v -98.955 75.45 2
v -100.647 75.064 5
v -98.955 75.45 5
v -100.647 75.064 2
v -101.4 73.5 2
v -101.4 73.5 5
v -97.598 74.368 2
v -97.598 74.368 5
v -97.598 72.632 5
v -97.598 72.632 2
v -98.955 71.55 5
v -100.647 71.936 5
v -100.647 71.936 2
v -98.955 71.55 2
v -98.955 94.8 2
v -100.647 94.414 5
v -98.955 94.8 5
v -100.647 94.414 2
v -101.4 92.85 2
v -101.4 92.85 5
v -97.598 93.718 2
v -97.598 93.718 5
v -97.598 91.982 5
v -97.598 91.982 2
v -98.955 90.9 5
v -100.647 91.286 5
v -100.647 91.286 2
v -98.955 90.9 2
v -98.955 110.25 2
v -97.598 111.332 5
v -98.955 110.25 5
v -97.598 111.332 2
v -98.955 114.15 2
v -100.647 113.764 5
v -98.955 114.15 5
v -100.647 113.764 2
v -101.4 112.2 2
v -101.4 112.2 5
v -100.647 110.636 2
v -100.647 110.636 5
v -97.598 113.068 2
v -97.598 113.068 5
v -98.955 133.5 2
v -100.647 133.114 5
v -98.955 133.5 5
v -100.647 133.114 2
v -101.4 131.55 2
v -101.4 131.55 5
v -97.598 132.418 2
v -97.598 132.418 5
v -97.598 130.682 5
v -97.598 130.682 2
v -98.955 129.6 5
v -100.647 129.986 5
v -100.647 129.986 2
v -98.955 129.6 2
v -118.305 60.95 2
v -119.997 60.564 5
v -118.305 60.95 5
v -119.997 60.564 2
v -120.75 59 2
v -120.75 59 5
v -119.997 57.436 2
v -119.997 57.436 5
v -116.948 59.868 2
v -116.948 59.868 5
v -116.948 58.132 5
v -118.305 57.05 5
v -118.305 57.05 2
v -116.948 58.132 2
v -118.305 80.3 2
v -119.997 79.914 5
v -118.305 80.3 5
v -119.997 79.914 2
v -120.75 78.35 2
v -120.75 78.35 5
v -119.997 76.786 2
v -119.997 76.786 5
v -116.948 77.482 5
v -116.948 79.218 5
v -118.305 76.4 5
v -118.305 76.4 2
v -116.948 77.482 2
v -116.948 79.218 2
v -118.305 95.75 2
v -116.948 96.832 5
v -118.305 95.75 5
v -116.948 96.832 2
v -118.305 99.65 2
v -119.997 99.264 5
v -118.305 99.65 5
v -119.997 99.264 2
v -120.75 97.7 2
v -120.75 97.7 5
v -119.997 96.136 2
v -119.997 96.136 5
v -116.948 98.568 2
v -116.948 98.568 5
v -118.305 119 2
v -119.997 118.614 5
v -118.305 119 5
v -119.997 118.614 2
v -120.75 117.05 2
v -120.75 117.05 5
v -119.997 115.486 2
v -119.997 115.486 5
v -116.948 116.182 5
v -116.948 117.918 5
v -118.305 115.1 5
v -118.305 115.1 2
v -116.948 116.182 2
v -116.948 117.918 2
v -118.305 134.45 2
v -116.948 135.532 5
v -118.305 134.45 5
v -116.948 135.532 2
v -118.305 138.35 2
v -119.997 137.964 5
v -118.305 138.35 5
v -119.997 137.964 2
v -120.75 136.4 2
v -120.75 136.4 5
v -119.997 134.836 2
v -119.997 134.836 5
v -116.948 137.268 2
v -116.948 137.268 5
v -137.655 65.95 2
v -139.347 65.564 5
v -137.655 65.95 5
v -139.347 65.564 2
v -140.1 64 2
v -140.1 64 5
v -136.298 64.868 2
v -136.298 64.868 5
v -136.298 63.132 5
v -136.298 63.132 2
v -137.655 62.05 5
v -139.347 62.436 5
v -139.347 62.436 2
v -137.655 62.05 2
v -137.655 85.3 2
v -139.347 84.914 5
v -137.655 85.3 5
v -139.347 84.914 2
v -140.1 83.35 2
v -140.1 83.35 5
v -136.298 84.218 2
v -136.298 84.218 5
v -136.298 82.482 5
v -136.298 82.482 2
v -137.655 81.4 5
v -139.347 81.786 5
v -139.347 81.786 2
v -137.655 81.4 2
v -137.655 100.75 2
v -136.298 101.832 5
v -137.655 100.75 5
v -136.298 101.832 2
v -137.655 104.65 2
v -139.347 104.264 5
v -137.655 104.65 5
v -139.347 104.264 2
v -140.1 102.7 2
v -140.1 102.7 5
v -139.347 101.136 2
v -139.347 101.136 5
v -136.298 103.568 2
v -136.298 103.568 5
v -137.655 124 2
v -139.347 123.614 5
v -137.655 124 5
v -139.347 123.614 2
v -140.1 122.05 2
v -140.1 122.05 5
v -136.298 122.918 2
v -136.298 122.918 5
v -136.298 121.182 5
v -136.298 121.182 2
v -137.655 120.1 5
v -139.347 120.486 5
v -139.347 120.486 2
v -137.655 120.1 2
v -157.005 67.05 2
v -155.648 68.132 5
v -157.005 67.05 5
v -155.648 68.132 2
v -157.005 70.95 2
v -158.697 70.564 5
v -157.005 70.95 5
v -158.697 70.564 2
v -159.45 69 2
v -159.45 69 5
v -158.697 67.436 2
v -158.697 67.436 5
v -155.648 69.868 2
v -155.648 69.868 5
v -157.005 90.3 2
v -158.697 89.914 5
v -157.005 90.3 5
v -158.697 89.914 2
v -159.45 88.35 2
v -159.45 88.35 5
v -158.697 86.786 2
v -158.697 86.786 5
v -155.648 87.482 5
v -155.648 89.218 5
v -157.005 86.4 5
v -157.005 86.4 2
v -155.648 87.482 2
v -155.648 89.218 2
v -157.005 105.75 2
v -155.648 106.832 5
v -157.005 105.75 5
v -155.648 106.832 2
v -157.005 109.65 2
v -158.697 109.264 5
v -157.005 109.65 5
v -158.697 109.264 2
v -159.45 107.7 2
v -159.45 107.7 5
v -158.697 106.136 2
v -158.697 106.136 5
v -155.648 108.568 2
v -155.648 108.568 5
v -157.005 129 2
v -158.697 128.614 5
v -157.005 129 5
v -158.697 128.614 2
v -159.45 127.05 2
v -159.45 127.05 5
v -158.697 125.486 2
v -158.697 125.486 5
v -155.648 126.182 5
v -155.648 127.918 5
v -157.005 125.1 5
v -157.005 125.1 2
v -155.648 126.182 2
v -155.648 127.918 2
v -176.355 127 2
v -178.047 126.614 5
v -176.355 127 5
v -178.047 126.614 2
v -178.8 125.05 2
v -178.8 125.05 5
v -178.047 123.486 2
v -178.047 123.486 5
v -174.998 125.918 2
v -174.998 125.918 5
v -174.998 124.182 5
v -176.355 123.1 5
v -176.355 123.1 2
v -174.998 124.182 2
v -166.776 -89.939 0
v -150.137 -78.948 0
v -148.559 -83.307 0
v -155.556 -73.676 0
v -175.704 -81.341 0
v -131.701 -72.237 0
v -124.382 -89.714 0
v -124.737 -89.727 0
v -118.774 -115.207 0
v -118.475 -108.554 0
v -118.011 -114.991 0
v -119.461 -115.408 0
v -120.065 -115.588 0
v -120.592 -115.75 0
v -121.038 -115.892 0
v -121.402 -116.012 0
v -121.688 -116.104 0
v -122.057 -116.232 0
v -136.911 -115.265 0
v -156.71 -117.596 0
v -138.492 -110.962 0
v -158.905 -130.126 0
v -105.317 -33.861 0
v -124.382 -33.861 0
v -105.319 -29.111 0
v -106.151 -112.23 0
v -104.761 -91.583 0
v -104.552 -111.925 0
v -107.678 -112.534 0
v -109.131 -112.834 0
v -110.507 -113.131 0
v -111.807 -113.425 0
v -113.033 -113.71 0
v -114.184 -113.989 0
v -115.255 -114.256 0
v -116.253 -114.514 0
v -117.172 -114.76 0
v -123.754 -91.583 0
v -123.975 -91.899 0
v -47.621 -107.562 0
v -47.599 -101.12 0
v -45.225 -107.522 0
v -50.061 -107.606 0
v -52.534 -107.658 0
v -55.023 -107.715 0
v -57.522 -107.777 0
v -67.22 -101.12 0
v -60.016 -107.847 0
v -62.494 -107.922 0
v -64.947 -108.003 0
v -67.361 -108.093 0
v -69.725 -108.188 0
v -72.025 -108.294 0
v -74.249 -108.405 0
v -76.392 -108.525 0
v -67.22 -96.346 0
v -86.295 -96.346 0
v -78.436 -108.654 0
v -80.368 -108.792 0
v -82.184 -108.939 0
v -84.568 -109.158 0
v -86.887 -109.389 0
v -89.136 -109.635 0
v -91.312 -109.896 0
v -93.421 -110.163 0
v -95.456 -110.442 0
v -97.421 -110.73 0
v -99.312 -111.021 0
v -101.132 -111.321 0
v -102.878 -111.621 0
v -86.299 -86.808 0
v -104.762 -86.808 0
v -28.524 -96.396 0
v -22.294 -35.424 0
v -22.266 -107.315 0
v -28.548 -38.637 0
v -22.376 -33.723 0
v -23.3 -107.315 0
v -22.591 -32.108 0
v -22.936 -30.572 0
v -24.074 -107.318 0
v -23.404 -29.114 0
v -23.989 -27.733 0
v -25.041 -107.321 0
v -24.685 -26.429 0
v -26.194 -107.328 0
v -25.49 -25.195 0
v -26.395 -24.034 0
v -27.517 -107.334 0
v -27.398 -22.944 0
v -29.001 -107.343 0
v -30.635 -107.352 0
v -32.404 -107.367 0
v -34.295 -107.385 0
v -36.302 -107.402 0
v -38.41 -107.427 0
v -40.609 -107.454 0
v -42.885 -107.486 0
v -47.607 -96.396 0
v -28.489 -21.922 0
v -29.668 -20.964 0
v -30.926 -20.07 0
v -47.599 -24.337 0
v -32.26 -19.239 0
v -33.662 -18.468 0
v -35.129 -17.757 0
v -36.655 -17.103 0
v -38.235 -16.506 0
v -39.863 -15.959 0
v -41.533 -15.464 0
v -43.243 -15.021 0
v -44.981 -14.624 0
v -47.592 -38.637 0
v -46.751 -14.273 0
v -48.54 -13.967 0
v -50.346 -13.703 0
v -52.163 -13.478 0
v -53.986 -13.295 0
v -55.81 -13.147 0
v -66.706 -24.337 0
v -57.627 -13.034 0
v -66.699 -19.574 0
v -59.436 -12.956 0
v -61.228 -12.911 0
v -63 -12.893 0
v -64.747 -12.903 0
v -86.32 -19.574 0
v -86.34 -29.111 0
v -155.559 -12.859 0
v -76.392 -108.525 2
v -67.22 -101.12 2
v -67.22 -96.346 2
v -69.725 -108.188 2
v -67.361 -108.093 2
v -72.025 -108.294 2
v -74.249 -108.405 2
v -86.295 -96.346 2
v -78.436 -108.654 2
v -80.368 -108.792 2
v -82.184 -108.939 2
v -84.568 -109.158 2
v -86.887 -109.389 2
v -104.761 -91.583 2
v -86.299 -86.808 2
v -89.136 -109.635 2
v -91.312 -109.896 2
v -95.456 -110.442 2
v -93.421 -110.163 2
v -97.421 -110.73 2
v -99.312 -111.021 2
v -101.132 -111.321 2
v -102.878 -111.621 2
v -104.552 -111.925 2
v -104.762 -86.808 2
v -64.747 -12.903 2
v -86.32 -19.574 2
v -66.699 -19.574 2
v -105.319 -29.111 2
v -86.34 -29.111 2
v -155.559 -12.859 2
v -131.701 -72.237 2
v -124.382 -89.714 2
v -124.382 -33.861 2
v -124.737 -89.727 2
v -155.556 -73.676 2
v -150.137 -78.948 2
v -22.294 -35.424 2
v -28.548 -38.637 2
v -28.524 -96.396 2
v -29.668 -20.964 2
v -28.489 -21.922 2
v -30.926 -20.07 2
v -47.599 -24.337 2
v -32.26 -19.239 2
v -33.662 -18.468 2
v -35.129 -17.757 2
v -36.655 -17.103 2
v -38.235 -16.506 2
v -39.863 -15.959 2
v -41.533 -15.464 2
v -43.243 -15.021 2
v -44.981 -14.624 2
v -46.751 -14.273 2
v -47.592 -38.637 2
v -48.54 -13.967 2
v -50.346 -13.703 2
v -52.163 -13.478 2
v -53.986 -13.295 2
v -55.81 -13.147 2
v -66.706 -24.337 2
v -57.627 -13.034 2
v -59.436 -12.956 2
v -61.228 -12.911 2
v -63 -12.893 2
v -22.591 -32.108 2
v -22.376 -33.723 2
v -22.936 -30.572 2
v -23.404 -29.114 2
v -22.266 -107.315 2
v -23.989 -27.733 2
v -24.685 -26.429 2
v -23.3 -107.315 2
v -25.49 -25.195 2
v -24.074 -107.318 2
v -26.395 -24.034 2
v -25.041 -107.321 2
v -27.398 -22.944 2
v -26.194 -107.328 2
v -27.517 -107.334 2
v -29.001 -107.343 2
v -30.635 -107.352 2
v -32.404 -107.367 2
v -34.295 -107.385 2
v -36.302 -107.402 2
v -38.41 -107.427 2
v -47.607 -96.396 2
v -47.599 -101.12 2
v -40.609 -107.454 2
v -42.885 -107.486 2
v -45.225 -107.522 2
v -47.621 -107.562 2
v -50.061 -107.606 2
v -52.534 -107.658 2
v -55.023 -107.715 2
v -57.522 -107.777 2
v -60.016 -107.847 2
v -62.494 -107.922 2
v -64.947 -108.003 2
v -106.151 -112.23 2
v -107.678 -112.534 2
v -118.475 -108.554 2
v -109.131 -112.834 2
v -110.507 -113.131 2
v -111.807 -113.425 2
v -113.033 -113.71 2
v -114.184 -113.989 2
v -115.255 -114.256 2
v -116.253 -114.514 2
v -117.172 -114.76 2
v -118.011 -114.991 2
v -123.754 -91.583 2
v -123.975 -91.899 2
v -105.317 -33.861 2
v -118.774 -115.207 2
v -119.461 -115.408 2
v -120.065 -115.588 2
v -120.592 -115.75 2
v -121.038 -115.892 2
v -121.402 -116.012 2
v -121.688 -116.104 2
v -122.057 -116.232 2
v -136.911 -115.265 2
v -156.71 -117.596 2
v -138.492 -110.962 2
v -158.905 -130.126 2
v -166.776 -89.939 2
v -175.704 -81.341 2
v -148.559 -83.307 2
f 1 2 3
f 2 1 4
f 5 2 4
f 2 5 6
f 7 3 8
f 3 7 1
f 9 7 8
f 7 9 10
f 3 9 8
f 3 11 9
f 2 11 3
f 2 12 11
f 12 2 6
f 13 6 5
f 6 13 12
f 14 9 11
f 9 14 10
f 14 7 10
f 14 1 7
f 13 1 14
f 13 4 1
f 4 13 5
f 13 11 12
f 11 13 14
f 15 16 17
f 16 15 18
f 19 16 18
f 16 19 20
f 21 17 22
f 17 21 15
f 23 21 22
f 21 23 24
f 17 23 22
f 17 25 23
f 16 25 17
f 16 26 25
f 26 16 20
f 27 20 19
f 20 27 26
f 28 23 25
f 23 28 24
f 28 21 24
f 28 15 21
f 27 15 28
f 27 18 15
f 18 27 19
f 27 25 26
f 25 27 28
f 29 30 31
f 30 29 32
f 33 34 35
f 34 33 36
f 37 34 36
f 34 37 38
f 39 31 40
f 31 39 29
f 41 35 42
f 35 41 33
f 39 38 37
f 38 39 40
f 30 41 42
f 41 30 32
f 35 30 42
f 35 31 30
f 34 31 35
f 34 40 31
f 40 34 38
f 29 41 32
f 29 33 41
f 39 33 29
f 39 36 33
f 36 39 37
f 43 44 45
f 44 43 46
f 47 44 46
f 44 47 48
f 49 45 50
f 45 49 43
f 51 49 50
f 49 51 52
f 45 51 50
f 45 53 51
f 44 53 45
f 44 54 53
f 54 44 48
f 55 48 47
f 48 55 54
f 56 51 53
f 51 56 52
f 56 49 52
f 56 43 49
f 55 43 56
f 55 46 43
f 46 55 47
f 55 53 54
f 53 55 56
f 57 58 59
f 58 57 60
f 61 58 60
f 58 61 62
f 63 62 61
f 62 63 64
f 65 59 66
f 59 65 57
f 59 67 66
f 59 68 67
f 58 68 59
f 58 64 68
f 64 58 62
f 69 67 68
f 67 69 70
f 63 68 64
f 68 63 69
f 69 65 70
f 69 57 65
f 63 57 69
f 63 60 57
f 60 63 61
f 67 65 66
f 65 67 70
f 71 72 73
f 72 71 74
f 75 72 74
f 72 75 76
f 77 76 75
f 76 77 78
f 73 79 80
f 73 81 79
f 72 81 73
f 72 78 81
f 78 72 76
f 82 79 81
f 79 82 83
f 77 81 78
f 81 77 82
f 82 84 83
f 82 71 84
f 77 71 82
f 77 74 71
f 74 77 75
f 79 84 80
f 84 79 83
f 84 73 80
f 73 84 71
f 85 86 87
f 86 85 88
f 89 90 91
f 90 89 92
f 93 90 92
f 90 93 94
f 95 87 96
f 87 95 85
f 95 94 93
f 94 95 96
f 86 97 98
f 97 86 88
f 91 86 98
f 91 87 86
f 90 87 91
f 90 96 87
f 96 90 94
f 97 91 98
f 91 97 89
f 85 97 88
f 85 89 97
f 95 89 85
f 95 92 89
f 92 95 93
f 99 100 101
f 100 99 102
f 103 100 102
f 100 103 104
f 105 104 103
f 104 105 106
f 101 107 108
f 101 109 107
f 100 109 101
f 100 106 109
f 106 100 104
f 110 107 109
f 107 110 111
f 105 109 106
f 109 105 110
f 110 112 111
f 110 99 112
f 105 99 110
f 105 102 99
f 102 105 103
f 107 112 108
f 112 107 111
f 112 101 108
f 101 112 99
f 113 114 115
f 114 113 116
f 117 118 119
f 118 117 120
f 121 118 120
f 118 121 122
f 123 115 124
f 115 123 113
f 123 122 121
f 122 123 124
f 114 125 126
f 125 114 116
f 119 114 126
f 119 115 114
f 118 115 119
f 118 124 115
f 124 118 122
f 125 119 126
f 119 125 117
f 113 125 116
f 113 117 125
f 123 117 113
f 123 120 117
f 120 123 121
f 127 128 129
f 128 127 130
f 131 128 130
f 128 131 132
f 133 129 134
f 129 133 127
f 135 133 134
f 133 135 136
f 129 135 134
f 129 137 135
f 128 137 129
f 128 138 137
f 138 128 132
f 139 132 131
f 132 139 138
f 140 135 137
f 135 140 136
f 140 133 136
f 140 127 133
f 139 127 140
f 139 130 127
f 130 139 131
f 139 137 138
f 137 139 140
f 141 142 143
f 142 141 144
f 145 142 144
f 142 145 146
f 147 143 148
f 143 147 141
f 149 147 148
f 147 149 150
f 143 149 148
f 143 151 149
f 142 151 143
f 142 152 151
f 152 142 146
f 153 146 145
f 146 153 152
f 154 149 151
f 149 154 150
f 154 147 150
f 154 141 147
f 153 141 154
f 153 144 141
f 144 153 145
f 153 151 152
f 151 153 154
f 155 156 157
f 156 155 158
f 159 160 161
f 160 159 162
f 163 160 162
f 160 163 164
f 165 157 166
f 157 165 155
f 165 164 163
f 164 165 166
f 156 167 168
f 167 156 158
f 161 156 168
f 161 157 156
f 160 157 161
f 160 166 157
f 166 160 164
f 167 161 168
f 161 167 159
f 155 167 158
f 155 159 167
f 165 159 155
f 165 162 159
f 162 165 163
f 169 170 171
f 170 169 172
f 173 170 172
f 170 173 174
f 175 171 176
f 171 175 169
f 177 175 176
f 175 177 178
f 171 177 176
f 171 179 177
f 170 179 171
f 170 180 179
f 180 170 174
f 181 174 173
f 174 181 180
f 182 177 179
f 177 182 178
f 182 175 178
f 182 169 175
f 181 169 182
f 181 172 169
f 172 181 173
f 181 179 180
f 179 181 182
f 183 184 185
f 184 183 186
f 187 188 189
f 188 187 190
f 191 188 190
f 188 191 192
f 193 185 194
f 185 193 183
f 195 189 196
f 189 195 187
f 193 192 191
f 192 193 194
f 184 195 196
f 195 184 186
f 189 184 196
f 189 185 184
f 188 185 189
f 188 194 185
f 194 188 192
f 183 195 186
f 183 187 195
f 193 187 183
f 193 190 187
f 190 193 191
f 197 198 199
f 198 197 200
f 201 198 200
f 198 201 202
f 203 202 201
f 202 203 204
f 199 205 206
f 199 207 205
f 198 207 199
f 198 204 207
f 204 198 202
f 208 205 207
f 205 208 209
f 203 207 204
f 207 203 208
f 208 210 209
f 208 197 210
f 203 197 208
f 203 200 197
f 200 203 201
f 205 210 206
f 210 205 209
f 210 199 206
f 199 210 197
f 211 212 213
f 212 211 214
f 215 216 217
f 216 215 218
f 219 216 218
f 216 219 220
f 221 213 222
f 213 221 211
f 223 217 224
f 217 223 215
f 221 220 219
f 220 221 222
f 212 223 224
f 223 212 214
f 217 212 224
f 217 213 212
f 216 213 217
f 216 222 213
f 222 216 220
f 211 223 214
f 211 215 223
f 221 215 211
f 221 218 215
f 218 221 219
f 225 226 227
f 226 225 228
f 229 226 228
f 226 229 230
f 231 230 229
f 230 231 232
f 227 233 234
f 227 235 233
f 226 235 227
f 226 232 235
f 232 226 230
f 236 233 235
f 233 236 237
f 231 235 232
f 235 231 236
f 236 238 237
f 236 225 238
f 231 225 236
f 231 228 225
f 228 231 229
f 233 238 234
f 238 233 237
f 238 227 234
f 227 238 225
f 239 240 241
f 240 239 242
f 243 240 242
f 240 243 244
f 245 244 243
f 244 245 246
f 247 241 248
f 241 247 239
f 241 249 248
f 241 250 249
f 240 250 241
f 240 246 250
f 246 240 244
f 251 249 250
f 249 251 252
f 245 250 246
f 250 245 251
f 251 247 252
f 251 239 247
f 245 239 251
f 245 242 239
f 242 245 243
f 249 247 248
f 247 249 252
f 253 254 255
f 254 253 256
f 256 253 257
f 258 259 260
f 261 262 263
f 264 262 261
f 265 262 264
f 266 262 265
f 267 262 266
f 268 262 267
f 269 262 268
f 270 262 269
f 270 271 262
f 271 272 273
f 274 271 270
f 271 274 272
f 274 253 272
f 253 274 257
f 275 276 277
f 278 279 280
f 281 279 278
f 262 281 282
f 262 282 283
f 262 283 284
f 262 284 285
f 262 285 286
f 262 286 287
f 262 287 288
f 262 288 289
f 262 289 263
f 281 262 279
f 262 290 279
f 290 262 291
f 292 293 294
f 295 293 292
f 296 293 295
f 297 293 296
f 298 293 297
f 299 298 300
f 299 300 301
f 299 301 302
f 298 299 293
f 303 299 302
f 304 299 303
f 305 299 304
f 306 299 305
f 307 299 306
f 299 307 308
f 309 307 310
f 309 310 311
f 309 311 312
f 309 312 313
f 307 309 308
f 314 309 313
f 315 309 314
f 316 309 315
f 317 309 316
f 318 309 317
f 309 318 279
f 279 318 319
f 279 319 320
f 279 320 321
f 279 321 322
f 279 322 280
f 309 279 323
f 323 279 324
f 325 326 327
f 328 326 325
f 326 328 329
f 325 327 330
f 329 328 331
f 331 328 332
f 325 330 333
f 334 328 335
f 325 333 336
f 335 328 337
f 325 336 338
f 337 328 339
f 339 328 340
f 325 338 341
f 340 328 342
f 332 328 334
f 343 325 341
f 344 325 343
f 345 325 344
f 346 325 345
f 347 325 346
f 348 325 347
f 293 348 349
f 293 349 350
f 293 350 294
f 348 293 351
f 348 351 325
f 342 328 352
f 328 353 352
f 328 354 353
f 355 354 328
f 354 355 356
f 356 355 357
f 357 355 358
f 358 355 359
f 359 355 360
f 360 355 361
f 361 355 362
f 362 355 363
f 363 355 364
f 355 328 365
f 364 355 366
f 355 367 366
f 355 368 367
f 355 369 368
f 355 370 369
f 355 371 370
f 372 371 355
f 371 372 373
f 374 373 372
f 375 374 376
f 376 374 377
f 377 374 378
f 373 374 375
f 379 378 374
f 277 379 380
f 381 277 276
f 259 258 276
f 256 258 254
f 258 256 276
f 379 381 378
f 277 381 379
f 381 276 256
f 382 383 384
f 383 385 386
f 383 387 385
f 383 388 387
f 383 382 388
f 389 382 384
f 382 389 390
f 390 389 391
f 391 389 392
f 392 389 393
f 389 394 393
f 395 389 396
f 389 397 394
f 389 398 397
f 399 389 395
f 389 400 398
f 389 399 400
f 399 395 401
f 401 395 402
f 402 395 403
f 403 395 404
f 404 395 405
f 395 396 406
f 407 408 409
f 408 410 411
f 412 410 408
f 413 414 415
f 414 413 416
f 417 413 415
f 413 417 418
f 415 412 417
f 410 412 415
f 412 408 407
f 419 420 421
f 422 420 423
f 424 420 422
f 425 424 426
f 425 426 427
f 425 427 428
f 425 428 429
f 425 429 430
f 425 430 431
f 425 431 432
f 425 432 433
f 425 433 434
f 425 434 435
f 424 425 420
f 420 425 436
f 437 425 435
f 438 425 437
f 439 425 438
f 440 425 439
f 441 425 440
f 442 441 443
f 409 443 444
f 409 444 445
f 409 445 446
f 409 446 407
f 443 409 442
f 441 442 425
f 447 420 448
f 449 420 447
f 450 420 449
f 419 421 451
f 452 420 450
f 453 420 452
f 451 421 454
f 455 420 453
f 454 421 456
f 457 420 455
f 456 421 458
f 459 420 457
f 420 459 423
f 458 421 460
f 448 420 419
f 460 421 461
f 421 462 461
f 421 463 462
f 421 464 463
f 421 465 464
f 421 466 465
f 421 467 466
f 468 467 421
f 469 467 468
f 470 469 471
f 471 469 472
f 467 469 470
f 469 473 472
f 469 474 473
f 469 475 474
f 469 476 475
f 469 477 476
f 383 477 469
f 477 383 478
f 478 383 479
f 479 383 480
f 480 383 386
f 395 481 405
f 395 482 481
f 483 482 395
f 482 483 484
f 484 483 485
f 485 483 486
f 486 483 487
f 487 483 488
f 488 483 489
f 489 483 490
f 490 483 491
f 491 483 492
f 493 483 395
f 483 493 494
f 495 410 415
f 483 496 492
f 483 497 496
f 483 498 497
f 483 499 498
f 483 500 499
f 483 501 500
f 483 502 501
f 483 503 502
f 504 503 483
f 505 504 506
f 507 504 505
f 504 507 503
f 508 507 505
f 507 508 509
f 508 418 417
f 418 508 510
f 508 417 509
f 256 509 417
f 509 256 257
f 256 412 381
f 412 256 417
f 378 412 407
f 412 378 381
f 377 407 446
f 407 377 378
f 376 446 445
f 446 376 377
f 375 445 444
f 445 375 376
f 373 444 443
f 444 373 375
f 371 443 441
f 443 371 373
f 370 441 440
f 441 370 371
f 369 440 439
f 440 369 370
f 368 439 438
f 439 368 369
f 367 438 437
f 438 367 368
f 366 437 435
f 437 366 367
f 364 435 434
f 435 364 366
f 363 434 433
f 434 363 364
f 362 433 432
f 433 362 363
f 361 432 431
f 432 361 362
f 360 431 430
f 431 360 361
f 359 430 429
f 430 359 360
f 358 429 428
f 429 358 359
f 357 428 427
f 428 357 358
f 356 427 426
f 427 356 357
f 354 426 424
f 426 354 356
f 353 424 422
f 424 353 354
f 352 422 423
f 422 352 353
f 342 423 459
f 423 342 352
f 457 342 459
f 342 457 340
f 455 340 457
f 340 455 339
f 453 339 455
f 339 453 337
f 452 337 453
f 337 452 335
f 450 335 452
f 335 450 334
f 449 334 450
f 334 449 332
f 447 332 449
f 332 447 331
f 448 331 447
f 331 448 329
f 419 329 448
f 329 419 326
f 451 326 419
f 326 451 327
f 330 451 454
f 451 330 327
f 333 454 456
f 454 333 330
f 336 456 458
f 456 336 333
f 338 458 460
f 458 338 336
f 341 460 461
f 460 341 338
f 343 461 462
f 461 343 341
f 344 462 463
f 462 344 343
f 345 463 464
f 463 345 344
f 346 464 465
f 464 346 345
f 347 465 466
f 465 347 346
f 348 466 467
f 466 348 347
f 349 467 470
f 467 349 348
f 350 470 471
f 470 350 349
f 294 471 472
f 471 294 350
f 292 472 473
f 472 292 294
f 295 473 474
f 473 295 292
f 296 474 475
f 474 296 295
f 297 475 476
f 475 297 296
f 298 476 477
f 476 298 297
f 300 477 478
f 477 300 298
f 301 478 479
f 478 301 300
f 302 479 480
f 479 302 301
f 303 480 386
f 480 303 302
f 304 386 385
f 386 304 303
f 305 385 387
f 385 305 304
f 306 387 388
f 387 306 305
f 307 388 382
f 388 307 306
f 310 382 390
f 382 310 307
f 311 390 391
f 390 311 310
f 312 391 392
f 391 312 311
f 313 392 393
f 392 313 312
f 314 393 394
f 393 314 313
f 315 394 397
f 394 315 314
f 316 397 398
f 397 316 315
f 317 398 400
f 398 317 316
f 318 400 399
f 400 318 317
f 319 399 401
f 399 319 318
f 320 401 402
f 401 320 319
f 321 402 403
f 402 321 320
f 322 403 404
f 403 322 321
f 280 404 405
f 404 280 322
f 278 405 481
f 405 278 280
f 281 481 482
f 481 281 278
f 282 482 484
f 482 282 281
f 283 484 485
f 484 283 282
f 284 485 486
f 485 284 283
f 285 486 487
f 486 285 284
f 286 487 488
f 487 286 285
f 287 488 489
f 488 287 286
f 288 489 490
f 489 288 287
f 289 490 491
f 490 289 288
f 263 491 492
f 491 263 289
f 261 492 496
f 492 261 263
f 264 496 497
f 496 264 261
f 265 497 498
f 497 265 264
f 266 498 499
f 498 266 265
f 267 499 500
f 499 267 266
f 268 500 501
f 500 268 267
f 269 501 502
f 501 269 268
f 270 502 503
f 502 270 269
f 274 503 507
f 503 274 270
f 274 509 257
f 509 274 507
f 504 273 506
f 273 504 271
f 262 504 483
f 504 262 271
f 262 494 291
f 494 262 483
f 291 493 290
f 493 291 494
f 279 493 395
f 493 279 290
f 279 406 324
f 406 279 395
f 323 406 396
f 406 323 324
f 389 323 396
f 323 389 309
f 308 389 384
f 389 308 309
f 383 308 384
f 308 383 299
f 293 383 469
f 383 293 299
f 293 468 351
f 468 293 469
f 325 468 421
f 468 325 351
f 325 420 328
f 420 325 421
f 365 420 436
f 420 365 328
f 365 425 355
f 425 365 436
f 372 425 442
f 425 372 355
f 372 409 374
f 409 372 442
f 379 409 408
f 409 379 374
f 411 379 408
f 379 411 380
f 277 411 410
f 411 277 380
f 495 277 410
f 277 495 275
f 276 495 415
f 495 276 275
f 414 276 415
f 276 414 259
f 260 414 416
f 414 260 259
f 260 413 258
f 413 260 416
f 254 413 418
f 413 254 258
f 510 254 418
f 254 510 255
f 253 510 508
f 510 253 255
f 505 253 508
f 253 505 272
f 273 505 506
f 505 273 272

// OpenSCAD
translate([0,0,0]) mirror([1,0,0]) linear_extrude(file="./top-plate.dxf", height=2);

mx_size = 19.35;
mirror([1,0,0]) {
    for (i=[0:3]) {
        translate([99.4,73.5+i*mx_size,2]) cylinder(3,2,2);
    }
    for (i=[0:4]) {
        translate([99.4+mx_size,59+i*mx_size,2]) cylinder(3,2,2);
    }
    for (i=[0:3]) {
        translate([99.4+mx_size*2,64+i*mx_size,2]) cylinder(3,2,2);
    }
    for (i=[0:3]) {
        translate([99.4+mx_size*3,69+i*mx_size,2]) cylinder(3,2,2);
    }
    translate([99.4+mx_size*4,67+3*mx_size,2]) cylinder(3,2,2);
}
